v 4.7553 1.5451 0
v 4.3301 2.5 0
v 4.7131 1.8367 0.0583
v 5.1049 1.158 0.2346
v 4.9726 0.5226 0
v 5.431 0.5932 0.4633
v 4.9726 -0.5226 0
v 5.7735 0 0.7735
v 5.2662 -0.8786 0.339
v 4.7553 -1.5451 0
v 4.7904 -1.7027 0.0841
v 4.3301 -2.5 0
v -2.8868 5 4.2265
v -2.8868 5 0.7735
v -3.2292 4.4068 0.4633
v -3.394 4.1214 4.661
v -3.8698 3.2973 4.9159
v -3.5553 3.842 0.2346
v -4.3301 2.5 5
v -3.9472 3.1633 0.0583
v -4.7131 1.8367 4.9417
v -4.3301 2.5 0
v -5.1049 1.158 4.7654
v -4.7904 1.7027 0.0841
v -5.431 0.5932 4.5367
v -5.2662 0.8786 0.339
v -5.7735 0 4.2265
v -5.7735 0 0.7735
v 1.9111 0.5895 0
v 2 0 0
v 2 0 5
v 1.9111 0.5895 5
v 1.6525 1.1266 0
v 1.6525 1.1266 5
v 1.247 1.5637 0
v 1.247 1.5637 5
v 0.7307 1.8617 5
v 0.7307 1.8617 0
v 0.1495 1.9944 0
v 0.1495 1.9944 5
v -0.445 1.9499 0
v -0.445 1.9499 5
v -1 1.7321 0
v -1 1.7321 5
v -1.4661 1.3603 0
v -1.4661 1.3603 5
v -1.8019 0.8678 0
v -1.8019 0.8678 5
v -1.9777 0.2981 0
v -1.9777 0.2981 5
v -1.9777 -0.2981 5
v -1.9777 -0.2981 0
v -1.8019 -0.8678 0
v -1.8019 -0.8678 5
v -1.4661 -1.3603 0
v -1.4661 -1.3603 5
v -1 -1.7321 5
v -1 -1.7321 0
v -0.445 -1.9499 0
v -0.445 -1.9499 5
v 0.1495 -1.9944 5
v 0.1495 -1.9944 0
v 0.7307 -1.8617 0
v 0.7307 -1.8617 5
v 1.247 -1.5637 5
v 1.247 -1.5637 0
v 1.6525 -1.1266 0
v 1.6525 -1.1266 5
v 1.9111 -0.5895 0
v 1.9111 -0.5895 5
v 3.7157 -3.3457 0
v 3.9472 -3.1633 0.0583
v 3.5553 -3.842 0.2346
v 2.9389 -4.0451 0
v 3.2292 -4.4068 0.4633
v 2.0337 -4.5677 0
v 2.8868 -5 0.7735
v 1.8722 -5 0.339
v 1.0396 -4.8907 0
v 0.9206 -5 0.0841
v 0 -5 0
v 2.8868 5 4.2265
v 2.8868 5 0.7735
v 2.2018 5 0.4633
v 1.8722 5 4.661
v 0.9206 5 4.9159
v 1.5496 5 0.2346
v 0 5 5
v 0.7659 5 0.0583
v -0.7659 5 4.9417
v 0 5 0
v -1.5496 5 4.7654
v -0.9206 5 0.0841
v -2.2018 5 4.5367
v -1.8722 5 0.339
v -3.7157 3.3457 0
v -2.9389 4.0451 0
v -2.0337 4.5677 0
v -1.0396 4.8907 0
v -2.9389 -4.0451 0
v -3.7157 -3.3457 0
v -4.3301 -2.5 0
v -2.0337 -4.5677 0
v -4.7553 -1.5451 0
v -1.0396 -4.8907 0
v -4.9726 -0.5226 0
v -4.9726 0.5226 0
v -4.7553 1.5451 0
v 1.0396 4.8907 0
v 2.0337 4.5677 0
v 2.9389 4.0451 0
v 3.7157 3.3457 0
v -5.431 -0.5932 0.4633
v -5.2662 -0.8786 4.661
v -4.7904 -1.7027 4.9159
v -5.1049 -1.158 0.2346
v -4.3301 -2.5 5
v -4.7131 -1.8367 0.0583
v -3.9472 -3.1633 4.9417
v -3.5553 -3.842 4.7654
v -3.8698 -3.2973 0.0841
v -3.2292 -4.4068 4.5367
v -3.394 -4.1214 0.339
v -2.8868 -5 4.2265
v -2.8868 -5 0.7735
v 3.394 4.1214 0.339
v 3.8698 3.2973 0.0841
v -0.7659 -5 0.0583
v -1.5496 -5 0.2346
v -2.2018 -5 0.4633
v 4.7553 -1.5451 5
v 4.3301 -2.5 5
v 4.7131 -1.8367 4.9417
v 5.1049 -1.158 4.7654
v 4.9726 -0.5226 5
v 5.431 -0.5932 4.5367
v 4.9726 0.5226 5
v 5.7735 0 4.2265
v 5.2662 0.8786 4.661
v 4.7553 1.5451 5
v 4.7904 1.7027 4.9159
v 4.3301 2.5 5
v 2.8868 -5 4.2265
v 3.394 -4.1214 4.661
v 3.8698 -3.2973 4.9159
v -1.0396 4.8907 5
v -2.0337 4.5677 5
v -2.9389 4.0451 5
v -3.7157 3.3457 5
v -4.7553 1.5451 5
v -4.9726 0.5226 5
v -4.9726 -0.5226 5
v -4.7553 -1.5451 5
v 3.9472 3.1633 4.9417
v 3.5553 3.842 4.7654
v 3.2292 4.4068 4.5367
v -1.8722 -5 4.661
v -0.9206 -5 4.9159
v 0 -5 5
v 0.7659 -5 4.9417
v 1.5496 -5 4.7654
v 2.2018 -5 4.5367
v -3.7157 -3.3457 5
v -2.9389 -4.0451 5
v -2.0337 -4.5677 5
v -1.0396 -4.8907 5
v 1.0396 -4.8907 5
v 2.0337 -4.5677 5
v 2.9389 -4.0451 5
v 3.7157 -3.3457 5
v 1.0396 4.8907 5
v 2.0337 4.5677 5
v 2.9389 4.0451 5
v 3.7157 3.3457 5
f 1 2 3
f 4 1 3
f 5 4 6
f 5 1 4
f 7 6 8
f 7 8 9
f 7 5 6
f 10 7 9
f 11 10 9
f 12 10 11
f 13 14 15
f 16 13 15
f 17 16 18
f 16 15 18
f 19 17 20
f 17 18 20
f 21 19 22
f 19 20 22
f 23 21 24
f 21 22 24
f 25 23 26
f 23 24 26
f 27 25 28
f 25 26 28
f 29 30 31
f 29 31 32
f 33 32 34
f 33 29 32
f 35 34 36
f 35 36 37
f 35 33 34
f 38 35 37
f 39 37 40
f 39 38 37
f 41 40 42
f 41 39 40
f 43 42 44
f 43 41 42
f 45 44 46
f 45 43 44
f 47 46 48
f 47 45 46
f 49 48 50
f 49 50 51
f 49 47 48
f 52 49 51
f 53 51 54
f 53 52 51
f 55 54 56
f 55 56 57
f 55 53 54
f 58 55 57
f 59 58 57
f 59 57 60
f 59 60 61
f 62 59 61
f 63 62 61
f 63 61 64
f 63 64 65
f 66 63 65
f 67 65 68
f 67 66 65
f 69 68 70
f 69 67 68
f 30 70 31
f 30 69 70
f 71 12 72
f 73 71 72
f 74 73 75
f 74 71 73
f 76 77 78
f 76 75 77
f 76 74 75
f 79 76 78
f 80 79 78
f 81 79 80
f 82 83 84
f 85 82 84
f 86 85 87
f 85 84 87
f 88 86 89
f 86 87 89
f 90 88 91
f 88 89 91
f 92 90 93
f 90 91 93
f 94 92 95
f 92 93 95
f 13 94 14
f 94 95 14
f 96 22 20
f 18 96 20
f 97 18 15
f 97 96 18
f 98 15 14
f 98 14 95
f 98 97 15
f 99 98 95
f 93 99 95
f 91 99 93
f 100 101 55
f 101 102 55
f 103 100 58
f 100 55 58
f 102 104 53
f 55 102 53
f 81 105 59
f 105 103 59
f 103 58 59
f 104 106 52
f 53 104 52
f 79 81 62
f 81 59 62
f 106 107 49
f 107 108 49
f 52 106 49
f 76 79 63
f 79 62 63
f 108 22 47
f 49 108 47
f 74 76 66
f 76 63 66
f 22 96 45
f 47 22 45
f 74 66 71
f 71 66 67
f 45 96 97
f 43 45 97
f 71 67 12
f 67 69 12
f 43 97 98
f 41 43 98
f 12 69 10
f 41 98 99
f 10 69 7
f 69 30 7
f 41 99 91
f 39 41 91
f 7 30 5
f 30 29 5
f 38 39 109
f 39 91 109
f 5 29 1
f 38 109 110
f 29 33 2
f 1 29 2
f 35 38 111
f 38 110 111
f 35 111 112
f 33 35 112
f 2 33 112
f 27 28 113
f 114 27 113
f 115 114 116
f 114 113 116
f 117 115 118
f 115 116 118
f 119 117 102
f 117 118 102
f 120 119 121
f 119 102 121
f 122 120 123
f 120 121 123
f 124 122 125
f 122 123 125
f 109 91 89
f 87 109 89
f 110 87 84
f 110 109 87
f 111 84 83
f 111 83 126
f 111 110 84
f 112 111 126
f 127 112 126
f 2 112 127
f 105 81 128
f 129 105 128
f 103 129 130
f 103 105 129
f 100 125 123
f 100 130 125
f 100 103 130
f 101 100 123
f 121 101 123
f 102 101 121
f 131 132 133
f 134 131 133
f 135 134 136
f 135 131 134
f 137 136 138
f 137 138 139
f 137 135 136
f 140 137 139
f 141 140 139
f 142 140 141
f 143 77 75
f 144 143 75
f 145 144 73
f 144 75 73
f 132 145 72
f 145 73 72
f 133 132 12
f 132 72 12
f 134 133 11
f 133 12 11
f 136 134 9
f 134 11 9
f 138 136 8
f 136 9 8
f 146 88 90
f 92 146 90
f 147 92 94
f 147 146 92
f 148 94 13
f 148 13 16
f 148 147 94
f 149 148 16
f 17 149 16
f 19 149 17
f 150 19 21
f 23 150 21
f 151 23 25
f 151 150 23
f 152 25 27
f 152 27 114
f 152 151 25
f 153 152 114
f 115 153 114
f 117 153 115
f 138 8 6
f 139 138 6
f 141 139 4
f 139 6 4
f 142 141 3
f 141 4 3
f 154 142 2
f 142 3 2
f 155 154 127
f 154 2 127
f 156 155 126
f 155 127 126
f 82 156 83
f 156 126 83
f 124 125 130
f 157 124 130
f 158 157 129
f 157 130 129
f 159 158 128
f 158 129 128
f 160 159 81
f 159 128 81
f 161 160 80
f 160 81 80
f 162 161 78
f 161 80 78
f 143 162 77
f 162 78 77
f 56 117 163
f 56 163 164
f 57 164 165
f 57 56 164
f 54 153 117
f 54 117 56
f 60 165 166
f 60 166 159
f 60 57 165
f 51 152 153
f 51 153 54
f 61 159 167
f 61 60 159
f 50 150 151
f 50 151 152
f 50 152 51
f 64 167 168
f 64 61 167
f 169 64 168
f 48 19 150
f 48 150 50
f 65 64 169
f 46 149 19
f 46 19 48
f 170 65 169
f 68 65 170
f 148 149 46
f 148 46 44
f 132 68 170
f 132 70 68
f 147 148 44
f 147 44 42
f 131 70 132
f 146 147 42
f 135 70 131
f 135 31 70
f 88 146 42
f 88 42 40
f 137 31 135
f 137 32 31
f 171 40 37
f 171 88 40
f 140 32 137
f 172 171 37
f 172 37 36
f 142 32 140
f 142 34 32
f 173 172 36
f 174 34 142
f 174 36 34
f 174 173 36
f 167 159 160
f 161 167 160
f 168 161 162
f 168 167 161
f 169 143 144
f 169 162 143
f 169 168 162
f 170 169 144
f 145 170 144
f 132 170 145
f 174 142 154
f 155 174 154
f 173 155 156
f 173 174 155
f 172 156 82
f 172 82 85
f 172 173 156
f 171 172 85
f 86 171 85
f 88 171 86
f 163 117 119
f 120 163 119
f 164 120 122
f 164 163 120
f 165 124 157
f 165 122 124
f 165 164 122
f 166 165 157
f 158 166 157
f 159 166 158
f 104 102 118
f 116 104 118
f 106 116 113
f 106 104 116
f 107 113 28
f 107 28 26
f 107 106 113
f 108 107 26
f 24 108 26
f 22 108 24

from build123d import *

# Parameters (mm, degrees)
IZIM1_R                     = 2
Y_KSEKLIK_EKSTR_ZYON1_DEPTH = 5
IZIM2_OUTSIDE_W             = 18.762
IZIM2_OUTSIDE_H             = 17.214
IZIM2_OUTSIDE_R             = 5
KES_EKSTR_ZYON1_DEPTH       = 1
KES_EKSTR_ZYON1_DRAFT       = -45
IZIM3_OUTSIDE_W             = 18.762
IZIM3_OUTSIDE_H             = 17.214
IZIM3_OUTSIDE_R             = 5
KES_EKSTR_ZYON2_DEPTH       = 1
KES_EKSTR_ZYON2_DRAFT       = -45


with BuildPart() as part:
    # Çizim1 → Yükseklik-Ekstrüzyon1 (new body)
    with BuildSketch(Plane.XY):
        Polygon((5.773502692, 0), (2.886751346, 5), (-2.886751346, 5), (-5.773502692, 0), (-2.886751346, -5), (2.886751346, -5), align=None)
        Circle(IZIM1_R, mode=Mode.SUBTRACT)
    extrude(amount=Y_KSEKLIK_EKSTR_ZYON1_DEPTH)


with BuildPart() as kes_ekstr_zyon1_tool:
    # Çizim2 outside → Kes-Ekstrüzyon1 (with draft: the straight prism first)
    with BuildSketch(Plane.XY.offset(5)):
        Rectangle(IZIM2_OUTSIDE_W, IZIM2_OUTSIDE_H)
        Circle(IZIM2_OUTSIDE_R, mode=Mode.SUBTRACT)
    extrude(amount=-KES_EKSTR_ZYON1_DEPTH)
    # Kes-Ekstrüzyon1: the draft: its side faces are tilted about the plane it starts from
    kes_ekstr_zyon1_sides = [kes_ekstr_zyon1_tool.faces().sort_by_distance(p)[0] for p in [
        (0, -8.607, 4.5),
        (9.381, 0, 4.5),
        (0, 8.607, 4.5),
        (-9.381, 0, 4.5),
        (-5, 0, 4.5),
    ]]
    draft(kes_ekstr_zyon1_sides, Plane.XY.offset(5), KES_EKSTR_ZYON1_DRAFT)


with BuildPart() as part_1:
    add(part.part)

    # Kes-Ekstrüzyon1: cut by kes_ekstr_zyon1_tool
    add(kes_ekstr_zyon1_tool.part, mode=Mode.SUBTRACT)


with BuildPart() as kes_ekstr_zyon2_tool:
    # Çizim3 outside → Kes-Ekstrüzyon2 (with draft: the straight prism first)
    with BuildSketch(Plane(origin=(0, 0, 0), x_dir=(-1, 0, 0), z_dir=(0, 0, -1))):
        Rectangle(IZIM3_OUTSIDE_W, IZIM3_OUTSIDE_H)
        Circle(IZIM3_OUTSIDE_R, mode=Mode.SUBTRACT)
    extrude(amount=-KES_EKSTR_ZYON2_DEPTH)
    # Kes-Ekstrüzyon2: the draft: its side faces are tilted about the plane it starts from
    kes_ekstr_zyon2_sides = [kes_ekstr_zyon2_tool.faces().sort_by_distance(p)[0] for p in [
        (0, -8.607, 0.5),
        (-9.381, 0, 0.5),
        (0, 8.607, 0.5),
        (9.381, 0, 0.5),
        (5, 0, 0.5),
    ]]
    draft(kes_ekstr_zyon2_sides, Plane(origin=(0, 0, 0), x_dir=(-1, 0, 0), z_dir=(0, 0, -1)), KES_EKSTR_ZYON2_DRAFT)


with BuildPart() as part_2:
    add(part_1.part)

    # Kes-Ekstrüzyon2: cut by kes_ekstr_zyon2_tool
    add(kes_ekstr_zyon2_tool.part, mode=Mode.SUBTRACT)


solid = part_2.part
